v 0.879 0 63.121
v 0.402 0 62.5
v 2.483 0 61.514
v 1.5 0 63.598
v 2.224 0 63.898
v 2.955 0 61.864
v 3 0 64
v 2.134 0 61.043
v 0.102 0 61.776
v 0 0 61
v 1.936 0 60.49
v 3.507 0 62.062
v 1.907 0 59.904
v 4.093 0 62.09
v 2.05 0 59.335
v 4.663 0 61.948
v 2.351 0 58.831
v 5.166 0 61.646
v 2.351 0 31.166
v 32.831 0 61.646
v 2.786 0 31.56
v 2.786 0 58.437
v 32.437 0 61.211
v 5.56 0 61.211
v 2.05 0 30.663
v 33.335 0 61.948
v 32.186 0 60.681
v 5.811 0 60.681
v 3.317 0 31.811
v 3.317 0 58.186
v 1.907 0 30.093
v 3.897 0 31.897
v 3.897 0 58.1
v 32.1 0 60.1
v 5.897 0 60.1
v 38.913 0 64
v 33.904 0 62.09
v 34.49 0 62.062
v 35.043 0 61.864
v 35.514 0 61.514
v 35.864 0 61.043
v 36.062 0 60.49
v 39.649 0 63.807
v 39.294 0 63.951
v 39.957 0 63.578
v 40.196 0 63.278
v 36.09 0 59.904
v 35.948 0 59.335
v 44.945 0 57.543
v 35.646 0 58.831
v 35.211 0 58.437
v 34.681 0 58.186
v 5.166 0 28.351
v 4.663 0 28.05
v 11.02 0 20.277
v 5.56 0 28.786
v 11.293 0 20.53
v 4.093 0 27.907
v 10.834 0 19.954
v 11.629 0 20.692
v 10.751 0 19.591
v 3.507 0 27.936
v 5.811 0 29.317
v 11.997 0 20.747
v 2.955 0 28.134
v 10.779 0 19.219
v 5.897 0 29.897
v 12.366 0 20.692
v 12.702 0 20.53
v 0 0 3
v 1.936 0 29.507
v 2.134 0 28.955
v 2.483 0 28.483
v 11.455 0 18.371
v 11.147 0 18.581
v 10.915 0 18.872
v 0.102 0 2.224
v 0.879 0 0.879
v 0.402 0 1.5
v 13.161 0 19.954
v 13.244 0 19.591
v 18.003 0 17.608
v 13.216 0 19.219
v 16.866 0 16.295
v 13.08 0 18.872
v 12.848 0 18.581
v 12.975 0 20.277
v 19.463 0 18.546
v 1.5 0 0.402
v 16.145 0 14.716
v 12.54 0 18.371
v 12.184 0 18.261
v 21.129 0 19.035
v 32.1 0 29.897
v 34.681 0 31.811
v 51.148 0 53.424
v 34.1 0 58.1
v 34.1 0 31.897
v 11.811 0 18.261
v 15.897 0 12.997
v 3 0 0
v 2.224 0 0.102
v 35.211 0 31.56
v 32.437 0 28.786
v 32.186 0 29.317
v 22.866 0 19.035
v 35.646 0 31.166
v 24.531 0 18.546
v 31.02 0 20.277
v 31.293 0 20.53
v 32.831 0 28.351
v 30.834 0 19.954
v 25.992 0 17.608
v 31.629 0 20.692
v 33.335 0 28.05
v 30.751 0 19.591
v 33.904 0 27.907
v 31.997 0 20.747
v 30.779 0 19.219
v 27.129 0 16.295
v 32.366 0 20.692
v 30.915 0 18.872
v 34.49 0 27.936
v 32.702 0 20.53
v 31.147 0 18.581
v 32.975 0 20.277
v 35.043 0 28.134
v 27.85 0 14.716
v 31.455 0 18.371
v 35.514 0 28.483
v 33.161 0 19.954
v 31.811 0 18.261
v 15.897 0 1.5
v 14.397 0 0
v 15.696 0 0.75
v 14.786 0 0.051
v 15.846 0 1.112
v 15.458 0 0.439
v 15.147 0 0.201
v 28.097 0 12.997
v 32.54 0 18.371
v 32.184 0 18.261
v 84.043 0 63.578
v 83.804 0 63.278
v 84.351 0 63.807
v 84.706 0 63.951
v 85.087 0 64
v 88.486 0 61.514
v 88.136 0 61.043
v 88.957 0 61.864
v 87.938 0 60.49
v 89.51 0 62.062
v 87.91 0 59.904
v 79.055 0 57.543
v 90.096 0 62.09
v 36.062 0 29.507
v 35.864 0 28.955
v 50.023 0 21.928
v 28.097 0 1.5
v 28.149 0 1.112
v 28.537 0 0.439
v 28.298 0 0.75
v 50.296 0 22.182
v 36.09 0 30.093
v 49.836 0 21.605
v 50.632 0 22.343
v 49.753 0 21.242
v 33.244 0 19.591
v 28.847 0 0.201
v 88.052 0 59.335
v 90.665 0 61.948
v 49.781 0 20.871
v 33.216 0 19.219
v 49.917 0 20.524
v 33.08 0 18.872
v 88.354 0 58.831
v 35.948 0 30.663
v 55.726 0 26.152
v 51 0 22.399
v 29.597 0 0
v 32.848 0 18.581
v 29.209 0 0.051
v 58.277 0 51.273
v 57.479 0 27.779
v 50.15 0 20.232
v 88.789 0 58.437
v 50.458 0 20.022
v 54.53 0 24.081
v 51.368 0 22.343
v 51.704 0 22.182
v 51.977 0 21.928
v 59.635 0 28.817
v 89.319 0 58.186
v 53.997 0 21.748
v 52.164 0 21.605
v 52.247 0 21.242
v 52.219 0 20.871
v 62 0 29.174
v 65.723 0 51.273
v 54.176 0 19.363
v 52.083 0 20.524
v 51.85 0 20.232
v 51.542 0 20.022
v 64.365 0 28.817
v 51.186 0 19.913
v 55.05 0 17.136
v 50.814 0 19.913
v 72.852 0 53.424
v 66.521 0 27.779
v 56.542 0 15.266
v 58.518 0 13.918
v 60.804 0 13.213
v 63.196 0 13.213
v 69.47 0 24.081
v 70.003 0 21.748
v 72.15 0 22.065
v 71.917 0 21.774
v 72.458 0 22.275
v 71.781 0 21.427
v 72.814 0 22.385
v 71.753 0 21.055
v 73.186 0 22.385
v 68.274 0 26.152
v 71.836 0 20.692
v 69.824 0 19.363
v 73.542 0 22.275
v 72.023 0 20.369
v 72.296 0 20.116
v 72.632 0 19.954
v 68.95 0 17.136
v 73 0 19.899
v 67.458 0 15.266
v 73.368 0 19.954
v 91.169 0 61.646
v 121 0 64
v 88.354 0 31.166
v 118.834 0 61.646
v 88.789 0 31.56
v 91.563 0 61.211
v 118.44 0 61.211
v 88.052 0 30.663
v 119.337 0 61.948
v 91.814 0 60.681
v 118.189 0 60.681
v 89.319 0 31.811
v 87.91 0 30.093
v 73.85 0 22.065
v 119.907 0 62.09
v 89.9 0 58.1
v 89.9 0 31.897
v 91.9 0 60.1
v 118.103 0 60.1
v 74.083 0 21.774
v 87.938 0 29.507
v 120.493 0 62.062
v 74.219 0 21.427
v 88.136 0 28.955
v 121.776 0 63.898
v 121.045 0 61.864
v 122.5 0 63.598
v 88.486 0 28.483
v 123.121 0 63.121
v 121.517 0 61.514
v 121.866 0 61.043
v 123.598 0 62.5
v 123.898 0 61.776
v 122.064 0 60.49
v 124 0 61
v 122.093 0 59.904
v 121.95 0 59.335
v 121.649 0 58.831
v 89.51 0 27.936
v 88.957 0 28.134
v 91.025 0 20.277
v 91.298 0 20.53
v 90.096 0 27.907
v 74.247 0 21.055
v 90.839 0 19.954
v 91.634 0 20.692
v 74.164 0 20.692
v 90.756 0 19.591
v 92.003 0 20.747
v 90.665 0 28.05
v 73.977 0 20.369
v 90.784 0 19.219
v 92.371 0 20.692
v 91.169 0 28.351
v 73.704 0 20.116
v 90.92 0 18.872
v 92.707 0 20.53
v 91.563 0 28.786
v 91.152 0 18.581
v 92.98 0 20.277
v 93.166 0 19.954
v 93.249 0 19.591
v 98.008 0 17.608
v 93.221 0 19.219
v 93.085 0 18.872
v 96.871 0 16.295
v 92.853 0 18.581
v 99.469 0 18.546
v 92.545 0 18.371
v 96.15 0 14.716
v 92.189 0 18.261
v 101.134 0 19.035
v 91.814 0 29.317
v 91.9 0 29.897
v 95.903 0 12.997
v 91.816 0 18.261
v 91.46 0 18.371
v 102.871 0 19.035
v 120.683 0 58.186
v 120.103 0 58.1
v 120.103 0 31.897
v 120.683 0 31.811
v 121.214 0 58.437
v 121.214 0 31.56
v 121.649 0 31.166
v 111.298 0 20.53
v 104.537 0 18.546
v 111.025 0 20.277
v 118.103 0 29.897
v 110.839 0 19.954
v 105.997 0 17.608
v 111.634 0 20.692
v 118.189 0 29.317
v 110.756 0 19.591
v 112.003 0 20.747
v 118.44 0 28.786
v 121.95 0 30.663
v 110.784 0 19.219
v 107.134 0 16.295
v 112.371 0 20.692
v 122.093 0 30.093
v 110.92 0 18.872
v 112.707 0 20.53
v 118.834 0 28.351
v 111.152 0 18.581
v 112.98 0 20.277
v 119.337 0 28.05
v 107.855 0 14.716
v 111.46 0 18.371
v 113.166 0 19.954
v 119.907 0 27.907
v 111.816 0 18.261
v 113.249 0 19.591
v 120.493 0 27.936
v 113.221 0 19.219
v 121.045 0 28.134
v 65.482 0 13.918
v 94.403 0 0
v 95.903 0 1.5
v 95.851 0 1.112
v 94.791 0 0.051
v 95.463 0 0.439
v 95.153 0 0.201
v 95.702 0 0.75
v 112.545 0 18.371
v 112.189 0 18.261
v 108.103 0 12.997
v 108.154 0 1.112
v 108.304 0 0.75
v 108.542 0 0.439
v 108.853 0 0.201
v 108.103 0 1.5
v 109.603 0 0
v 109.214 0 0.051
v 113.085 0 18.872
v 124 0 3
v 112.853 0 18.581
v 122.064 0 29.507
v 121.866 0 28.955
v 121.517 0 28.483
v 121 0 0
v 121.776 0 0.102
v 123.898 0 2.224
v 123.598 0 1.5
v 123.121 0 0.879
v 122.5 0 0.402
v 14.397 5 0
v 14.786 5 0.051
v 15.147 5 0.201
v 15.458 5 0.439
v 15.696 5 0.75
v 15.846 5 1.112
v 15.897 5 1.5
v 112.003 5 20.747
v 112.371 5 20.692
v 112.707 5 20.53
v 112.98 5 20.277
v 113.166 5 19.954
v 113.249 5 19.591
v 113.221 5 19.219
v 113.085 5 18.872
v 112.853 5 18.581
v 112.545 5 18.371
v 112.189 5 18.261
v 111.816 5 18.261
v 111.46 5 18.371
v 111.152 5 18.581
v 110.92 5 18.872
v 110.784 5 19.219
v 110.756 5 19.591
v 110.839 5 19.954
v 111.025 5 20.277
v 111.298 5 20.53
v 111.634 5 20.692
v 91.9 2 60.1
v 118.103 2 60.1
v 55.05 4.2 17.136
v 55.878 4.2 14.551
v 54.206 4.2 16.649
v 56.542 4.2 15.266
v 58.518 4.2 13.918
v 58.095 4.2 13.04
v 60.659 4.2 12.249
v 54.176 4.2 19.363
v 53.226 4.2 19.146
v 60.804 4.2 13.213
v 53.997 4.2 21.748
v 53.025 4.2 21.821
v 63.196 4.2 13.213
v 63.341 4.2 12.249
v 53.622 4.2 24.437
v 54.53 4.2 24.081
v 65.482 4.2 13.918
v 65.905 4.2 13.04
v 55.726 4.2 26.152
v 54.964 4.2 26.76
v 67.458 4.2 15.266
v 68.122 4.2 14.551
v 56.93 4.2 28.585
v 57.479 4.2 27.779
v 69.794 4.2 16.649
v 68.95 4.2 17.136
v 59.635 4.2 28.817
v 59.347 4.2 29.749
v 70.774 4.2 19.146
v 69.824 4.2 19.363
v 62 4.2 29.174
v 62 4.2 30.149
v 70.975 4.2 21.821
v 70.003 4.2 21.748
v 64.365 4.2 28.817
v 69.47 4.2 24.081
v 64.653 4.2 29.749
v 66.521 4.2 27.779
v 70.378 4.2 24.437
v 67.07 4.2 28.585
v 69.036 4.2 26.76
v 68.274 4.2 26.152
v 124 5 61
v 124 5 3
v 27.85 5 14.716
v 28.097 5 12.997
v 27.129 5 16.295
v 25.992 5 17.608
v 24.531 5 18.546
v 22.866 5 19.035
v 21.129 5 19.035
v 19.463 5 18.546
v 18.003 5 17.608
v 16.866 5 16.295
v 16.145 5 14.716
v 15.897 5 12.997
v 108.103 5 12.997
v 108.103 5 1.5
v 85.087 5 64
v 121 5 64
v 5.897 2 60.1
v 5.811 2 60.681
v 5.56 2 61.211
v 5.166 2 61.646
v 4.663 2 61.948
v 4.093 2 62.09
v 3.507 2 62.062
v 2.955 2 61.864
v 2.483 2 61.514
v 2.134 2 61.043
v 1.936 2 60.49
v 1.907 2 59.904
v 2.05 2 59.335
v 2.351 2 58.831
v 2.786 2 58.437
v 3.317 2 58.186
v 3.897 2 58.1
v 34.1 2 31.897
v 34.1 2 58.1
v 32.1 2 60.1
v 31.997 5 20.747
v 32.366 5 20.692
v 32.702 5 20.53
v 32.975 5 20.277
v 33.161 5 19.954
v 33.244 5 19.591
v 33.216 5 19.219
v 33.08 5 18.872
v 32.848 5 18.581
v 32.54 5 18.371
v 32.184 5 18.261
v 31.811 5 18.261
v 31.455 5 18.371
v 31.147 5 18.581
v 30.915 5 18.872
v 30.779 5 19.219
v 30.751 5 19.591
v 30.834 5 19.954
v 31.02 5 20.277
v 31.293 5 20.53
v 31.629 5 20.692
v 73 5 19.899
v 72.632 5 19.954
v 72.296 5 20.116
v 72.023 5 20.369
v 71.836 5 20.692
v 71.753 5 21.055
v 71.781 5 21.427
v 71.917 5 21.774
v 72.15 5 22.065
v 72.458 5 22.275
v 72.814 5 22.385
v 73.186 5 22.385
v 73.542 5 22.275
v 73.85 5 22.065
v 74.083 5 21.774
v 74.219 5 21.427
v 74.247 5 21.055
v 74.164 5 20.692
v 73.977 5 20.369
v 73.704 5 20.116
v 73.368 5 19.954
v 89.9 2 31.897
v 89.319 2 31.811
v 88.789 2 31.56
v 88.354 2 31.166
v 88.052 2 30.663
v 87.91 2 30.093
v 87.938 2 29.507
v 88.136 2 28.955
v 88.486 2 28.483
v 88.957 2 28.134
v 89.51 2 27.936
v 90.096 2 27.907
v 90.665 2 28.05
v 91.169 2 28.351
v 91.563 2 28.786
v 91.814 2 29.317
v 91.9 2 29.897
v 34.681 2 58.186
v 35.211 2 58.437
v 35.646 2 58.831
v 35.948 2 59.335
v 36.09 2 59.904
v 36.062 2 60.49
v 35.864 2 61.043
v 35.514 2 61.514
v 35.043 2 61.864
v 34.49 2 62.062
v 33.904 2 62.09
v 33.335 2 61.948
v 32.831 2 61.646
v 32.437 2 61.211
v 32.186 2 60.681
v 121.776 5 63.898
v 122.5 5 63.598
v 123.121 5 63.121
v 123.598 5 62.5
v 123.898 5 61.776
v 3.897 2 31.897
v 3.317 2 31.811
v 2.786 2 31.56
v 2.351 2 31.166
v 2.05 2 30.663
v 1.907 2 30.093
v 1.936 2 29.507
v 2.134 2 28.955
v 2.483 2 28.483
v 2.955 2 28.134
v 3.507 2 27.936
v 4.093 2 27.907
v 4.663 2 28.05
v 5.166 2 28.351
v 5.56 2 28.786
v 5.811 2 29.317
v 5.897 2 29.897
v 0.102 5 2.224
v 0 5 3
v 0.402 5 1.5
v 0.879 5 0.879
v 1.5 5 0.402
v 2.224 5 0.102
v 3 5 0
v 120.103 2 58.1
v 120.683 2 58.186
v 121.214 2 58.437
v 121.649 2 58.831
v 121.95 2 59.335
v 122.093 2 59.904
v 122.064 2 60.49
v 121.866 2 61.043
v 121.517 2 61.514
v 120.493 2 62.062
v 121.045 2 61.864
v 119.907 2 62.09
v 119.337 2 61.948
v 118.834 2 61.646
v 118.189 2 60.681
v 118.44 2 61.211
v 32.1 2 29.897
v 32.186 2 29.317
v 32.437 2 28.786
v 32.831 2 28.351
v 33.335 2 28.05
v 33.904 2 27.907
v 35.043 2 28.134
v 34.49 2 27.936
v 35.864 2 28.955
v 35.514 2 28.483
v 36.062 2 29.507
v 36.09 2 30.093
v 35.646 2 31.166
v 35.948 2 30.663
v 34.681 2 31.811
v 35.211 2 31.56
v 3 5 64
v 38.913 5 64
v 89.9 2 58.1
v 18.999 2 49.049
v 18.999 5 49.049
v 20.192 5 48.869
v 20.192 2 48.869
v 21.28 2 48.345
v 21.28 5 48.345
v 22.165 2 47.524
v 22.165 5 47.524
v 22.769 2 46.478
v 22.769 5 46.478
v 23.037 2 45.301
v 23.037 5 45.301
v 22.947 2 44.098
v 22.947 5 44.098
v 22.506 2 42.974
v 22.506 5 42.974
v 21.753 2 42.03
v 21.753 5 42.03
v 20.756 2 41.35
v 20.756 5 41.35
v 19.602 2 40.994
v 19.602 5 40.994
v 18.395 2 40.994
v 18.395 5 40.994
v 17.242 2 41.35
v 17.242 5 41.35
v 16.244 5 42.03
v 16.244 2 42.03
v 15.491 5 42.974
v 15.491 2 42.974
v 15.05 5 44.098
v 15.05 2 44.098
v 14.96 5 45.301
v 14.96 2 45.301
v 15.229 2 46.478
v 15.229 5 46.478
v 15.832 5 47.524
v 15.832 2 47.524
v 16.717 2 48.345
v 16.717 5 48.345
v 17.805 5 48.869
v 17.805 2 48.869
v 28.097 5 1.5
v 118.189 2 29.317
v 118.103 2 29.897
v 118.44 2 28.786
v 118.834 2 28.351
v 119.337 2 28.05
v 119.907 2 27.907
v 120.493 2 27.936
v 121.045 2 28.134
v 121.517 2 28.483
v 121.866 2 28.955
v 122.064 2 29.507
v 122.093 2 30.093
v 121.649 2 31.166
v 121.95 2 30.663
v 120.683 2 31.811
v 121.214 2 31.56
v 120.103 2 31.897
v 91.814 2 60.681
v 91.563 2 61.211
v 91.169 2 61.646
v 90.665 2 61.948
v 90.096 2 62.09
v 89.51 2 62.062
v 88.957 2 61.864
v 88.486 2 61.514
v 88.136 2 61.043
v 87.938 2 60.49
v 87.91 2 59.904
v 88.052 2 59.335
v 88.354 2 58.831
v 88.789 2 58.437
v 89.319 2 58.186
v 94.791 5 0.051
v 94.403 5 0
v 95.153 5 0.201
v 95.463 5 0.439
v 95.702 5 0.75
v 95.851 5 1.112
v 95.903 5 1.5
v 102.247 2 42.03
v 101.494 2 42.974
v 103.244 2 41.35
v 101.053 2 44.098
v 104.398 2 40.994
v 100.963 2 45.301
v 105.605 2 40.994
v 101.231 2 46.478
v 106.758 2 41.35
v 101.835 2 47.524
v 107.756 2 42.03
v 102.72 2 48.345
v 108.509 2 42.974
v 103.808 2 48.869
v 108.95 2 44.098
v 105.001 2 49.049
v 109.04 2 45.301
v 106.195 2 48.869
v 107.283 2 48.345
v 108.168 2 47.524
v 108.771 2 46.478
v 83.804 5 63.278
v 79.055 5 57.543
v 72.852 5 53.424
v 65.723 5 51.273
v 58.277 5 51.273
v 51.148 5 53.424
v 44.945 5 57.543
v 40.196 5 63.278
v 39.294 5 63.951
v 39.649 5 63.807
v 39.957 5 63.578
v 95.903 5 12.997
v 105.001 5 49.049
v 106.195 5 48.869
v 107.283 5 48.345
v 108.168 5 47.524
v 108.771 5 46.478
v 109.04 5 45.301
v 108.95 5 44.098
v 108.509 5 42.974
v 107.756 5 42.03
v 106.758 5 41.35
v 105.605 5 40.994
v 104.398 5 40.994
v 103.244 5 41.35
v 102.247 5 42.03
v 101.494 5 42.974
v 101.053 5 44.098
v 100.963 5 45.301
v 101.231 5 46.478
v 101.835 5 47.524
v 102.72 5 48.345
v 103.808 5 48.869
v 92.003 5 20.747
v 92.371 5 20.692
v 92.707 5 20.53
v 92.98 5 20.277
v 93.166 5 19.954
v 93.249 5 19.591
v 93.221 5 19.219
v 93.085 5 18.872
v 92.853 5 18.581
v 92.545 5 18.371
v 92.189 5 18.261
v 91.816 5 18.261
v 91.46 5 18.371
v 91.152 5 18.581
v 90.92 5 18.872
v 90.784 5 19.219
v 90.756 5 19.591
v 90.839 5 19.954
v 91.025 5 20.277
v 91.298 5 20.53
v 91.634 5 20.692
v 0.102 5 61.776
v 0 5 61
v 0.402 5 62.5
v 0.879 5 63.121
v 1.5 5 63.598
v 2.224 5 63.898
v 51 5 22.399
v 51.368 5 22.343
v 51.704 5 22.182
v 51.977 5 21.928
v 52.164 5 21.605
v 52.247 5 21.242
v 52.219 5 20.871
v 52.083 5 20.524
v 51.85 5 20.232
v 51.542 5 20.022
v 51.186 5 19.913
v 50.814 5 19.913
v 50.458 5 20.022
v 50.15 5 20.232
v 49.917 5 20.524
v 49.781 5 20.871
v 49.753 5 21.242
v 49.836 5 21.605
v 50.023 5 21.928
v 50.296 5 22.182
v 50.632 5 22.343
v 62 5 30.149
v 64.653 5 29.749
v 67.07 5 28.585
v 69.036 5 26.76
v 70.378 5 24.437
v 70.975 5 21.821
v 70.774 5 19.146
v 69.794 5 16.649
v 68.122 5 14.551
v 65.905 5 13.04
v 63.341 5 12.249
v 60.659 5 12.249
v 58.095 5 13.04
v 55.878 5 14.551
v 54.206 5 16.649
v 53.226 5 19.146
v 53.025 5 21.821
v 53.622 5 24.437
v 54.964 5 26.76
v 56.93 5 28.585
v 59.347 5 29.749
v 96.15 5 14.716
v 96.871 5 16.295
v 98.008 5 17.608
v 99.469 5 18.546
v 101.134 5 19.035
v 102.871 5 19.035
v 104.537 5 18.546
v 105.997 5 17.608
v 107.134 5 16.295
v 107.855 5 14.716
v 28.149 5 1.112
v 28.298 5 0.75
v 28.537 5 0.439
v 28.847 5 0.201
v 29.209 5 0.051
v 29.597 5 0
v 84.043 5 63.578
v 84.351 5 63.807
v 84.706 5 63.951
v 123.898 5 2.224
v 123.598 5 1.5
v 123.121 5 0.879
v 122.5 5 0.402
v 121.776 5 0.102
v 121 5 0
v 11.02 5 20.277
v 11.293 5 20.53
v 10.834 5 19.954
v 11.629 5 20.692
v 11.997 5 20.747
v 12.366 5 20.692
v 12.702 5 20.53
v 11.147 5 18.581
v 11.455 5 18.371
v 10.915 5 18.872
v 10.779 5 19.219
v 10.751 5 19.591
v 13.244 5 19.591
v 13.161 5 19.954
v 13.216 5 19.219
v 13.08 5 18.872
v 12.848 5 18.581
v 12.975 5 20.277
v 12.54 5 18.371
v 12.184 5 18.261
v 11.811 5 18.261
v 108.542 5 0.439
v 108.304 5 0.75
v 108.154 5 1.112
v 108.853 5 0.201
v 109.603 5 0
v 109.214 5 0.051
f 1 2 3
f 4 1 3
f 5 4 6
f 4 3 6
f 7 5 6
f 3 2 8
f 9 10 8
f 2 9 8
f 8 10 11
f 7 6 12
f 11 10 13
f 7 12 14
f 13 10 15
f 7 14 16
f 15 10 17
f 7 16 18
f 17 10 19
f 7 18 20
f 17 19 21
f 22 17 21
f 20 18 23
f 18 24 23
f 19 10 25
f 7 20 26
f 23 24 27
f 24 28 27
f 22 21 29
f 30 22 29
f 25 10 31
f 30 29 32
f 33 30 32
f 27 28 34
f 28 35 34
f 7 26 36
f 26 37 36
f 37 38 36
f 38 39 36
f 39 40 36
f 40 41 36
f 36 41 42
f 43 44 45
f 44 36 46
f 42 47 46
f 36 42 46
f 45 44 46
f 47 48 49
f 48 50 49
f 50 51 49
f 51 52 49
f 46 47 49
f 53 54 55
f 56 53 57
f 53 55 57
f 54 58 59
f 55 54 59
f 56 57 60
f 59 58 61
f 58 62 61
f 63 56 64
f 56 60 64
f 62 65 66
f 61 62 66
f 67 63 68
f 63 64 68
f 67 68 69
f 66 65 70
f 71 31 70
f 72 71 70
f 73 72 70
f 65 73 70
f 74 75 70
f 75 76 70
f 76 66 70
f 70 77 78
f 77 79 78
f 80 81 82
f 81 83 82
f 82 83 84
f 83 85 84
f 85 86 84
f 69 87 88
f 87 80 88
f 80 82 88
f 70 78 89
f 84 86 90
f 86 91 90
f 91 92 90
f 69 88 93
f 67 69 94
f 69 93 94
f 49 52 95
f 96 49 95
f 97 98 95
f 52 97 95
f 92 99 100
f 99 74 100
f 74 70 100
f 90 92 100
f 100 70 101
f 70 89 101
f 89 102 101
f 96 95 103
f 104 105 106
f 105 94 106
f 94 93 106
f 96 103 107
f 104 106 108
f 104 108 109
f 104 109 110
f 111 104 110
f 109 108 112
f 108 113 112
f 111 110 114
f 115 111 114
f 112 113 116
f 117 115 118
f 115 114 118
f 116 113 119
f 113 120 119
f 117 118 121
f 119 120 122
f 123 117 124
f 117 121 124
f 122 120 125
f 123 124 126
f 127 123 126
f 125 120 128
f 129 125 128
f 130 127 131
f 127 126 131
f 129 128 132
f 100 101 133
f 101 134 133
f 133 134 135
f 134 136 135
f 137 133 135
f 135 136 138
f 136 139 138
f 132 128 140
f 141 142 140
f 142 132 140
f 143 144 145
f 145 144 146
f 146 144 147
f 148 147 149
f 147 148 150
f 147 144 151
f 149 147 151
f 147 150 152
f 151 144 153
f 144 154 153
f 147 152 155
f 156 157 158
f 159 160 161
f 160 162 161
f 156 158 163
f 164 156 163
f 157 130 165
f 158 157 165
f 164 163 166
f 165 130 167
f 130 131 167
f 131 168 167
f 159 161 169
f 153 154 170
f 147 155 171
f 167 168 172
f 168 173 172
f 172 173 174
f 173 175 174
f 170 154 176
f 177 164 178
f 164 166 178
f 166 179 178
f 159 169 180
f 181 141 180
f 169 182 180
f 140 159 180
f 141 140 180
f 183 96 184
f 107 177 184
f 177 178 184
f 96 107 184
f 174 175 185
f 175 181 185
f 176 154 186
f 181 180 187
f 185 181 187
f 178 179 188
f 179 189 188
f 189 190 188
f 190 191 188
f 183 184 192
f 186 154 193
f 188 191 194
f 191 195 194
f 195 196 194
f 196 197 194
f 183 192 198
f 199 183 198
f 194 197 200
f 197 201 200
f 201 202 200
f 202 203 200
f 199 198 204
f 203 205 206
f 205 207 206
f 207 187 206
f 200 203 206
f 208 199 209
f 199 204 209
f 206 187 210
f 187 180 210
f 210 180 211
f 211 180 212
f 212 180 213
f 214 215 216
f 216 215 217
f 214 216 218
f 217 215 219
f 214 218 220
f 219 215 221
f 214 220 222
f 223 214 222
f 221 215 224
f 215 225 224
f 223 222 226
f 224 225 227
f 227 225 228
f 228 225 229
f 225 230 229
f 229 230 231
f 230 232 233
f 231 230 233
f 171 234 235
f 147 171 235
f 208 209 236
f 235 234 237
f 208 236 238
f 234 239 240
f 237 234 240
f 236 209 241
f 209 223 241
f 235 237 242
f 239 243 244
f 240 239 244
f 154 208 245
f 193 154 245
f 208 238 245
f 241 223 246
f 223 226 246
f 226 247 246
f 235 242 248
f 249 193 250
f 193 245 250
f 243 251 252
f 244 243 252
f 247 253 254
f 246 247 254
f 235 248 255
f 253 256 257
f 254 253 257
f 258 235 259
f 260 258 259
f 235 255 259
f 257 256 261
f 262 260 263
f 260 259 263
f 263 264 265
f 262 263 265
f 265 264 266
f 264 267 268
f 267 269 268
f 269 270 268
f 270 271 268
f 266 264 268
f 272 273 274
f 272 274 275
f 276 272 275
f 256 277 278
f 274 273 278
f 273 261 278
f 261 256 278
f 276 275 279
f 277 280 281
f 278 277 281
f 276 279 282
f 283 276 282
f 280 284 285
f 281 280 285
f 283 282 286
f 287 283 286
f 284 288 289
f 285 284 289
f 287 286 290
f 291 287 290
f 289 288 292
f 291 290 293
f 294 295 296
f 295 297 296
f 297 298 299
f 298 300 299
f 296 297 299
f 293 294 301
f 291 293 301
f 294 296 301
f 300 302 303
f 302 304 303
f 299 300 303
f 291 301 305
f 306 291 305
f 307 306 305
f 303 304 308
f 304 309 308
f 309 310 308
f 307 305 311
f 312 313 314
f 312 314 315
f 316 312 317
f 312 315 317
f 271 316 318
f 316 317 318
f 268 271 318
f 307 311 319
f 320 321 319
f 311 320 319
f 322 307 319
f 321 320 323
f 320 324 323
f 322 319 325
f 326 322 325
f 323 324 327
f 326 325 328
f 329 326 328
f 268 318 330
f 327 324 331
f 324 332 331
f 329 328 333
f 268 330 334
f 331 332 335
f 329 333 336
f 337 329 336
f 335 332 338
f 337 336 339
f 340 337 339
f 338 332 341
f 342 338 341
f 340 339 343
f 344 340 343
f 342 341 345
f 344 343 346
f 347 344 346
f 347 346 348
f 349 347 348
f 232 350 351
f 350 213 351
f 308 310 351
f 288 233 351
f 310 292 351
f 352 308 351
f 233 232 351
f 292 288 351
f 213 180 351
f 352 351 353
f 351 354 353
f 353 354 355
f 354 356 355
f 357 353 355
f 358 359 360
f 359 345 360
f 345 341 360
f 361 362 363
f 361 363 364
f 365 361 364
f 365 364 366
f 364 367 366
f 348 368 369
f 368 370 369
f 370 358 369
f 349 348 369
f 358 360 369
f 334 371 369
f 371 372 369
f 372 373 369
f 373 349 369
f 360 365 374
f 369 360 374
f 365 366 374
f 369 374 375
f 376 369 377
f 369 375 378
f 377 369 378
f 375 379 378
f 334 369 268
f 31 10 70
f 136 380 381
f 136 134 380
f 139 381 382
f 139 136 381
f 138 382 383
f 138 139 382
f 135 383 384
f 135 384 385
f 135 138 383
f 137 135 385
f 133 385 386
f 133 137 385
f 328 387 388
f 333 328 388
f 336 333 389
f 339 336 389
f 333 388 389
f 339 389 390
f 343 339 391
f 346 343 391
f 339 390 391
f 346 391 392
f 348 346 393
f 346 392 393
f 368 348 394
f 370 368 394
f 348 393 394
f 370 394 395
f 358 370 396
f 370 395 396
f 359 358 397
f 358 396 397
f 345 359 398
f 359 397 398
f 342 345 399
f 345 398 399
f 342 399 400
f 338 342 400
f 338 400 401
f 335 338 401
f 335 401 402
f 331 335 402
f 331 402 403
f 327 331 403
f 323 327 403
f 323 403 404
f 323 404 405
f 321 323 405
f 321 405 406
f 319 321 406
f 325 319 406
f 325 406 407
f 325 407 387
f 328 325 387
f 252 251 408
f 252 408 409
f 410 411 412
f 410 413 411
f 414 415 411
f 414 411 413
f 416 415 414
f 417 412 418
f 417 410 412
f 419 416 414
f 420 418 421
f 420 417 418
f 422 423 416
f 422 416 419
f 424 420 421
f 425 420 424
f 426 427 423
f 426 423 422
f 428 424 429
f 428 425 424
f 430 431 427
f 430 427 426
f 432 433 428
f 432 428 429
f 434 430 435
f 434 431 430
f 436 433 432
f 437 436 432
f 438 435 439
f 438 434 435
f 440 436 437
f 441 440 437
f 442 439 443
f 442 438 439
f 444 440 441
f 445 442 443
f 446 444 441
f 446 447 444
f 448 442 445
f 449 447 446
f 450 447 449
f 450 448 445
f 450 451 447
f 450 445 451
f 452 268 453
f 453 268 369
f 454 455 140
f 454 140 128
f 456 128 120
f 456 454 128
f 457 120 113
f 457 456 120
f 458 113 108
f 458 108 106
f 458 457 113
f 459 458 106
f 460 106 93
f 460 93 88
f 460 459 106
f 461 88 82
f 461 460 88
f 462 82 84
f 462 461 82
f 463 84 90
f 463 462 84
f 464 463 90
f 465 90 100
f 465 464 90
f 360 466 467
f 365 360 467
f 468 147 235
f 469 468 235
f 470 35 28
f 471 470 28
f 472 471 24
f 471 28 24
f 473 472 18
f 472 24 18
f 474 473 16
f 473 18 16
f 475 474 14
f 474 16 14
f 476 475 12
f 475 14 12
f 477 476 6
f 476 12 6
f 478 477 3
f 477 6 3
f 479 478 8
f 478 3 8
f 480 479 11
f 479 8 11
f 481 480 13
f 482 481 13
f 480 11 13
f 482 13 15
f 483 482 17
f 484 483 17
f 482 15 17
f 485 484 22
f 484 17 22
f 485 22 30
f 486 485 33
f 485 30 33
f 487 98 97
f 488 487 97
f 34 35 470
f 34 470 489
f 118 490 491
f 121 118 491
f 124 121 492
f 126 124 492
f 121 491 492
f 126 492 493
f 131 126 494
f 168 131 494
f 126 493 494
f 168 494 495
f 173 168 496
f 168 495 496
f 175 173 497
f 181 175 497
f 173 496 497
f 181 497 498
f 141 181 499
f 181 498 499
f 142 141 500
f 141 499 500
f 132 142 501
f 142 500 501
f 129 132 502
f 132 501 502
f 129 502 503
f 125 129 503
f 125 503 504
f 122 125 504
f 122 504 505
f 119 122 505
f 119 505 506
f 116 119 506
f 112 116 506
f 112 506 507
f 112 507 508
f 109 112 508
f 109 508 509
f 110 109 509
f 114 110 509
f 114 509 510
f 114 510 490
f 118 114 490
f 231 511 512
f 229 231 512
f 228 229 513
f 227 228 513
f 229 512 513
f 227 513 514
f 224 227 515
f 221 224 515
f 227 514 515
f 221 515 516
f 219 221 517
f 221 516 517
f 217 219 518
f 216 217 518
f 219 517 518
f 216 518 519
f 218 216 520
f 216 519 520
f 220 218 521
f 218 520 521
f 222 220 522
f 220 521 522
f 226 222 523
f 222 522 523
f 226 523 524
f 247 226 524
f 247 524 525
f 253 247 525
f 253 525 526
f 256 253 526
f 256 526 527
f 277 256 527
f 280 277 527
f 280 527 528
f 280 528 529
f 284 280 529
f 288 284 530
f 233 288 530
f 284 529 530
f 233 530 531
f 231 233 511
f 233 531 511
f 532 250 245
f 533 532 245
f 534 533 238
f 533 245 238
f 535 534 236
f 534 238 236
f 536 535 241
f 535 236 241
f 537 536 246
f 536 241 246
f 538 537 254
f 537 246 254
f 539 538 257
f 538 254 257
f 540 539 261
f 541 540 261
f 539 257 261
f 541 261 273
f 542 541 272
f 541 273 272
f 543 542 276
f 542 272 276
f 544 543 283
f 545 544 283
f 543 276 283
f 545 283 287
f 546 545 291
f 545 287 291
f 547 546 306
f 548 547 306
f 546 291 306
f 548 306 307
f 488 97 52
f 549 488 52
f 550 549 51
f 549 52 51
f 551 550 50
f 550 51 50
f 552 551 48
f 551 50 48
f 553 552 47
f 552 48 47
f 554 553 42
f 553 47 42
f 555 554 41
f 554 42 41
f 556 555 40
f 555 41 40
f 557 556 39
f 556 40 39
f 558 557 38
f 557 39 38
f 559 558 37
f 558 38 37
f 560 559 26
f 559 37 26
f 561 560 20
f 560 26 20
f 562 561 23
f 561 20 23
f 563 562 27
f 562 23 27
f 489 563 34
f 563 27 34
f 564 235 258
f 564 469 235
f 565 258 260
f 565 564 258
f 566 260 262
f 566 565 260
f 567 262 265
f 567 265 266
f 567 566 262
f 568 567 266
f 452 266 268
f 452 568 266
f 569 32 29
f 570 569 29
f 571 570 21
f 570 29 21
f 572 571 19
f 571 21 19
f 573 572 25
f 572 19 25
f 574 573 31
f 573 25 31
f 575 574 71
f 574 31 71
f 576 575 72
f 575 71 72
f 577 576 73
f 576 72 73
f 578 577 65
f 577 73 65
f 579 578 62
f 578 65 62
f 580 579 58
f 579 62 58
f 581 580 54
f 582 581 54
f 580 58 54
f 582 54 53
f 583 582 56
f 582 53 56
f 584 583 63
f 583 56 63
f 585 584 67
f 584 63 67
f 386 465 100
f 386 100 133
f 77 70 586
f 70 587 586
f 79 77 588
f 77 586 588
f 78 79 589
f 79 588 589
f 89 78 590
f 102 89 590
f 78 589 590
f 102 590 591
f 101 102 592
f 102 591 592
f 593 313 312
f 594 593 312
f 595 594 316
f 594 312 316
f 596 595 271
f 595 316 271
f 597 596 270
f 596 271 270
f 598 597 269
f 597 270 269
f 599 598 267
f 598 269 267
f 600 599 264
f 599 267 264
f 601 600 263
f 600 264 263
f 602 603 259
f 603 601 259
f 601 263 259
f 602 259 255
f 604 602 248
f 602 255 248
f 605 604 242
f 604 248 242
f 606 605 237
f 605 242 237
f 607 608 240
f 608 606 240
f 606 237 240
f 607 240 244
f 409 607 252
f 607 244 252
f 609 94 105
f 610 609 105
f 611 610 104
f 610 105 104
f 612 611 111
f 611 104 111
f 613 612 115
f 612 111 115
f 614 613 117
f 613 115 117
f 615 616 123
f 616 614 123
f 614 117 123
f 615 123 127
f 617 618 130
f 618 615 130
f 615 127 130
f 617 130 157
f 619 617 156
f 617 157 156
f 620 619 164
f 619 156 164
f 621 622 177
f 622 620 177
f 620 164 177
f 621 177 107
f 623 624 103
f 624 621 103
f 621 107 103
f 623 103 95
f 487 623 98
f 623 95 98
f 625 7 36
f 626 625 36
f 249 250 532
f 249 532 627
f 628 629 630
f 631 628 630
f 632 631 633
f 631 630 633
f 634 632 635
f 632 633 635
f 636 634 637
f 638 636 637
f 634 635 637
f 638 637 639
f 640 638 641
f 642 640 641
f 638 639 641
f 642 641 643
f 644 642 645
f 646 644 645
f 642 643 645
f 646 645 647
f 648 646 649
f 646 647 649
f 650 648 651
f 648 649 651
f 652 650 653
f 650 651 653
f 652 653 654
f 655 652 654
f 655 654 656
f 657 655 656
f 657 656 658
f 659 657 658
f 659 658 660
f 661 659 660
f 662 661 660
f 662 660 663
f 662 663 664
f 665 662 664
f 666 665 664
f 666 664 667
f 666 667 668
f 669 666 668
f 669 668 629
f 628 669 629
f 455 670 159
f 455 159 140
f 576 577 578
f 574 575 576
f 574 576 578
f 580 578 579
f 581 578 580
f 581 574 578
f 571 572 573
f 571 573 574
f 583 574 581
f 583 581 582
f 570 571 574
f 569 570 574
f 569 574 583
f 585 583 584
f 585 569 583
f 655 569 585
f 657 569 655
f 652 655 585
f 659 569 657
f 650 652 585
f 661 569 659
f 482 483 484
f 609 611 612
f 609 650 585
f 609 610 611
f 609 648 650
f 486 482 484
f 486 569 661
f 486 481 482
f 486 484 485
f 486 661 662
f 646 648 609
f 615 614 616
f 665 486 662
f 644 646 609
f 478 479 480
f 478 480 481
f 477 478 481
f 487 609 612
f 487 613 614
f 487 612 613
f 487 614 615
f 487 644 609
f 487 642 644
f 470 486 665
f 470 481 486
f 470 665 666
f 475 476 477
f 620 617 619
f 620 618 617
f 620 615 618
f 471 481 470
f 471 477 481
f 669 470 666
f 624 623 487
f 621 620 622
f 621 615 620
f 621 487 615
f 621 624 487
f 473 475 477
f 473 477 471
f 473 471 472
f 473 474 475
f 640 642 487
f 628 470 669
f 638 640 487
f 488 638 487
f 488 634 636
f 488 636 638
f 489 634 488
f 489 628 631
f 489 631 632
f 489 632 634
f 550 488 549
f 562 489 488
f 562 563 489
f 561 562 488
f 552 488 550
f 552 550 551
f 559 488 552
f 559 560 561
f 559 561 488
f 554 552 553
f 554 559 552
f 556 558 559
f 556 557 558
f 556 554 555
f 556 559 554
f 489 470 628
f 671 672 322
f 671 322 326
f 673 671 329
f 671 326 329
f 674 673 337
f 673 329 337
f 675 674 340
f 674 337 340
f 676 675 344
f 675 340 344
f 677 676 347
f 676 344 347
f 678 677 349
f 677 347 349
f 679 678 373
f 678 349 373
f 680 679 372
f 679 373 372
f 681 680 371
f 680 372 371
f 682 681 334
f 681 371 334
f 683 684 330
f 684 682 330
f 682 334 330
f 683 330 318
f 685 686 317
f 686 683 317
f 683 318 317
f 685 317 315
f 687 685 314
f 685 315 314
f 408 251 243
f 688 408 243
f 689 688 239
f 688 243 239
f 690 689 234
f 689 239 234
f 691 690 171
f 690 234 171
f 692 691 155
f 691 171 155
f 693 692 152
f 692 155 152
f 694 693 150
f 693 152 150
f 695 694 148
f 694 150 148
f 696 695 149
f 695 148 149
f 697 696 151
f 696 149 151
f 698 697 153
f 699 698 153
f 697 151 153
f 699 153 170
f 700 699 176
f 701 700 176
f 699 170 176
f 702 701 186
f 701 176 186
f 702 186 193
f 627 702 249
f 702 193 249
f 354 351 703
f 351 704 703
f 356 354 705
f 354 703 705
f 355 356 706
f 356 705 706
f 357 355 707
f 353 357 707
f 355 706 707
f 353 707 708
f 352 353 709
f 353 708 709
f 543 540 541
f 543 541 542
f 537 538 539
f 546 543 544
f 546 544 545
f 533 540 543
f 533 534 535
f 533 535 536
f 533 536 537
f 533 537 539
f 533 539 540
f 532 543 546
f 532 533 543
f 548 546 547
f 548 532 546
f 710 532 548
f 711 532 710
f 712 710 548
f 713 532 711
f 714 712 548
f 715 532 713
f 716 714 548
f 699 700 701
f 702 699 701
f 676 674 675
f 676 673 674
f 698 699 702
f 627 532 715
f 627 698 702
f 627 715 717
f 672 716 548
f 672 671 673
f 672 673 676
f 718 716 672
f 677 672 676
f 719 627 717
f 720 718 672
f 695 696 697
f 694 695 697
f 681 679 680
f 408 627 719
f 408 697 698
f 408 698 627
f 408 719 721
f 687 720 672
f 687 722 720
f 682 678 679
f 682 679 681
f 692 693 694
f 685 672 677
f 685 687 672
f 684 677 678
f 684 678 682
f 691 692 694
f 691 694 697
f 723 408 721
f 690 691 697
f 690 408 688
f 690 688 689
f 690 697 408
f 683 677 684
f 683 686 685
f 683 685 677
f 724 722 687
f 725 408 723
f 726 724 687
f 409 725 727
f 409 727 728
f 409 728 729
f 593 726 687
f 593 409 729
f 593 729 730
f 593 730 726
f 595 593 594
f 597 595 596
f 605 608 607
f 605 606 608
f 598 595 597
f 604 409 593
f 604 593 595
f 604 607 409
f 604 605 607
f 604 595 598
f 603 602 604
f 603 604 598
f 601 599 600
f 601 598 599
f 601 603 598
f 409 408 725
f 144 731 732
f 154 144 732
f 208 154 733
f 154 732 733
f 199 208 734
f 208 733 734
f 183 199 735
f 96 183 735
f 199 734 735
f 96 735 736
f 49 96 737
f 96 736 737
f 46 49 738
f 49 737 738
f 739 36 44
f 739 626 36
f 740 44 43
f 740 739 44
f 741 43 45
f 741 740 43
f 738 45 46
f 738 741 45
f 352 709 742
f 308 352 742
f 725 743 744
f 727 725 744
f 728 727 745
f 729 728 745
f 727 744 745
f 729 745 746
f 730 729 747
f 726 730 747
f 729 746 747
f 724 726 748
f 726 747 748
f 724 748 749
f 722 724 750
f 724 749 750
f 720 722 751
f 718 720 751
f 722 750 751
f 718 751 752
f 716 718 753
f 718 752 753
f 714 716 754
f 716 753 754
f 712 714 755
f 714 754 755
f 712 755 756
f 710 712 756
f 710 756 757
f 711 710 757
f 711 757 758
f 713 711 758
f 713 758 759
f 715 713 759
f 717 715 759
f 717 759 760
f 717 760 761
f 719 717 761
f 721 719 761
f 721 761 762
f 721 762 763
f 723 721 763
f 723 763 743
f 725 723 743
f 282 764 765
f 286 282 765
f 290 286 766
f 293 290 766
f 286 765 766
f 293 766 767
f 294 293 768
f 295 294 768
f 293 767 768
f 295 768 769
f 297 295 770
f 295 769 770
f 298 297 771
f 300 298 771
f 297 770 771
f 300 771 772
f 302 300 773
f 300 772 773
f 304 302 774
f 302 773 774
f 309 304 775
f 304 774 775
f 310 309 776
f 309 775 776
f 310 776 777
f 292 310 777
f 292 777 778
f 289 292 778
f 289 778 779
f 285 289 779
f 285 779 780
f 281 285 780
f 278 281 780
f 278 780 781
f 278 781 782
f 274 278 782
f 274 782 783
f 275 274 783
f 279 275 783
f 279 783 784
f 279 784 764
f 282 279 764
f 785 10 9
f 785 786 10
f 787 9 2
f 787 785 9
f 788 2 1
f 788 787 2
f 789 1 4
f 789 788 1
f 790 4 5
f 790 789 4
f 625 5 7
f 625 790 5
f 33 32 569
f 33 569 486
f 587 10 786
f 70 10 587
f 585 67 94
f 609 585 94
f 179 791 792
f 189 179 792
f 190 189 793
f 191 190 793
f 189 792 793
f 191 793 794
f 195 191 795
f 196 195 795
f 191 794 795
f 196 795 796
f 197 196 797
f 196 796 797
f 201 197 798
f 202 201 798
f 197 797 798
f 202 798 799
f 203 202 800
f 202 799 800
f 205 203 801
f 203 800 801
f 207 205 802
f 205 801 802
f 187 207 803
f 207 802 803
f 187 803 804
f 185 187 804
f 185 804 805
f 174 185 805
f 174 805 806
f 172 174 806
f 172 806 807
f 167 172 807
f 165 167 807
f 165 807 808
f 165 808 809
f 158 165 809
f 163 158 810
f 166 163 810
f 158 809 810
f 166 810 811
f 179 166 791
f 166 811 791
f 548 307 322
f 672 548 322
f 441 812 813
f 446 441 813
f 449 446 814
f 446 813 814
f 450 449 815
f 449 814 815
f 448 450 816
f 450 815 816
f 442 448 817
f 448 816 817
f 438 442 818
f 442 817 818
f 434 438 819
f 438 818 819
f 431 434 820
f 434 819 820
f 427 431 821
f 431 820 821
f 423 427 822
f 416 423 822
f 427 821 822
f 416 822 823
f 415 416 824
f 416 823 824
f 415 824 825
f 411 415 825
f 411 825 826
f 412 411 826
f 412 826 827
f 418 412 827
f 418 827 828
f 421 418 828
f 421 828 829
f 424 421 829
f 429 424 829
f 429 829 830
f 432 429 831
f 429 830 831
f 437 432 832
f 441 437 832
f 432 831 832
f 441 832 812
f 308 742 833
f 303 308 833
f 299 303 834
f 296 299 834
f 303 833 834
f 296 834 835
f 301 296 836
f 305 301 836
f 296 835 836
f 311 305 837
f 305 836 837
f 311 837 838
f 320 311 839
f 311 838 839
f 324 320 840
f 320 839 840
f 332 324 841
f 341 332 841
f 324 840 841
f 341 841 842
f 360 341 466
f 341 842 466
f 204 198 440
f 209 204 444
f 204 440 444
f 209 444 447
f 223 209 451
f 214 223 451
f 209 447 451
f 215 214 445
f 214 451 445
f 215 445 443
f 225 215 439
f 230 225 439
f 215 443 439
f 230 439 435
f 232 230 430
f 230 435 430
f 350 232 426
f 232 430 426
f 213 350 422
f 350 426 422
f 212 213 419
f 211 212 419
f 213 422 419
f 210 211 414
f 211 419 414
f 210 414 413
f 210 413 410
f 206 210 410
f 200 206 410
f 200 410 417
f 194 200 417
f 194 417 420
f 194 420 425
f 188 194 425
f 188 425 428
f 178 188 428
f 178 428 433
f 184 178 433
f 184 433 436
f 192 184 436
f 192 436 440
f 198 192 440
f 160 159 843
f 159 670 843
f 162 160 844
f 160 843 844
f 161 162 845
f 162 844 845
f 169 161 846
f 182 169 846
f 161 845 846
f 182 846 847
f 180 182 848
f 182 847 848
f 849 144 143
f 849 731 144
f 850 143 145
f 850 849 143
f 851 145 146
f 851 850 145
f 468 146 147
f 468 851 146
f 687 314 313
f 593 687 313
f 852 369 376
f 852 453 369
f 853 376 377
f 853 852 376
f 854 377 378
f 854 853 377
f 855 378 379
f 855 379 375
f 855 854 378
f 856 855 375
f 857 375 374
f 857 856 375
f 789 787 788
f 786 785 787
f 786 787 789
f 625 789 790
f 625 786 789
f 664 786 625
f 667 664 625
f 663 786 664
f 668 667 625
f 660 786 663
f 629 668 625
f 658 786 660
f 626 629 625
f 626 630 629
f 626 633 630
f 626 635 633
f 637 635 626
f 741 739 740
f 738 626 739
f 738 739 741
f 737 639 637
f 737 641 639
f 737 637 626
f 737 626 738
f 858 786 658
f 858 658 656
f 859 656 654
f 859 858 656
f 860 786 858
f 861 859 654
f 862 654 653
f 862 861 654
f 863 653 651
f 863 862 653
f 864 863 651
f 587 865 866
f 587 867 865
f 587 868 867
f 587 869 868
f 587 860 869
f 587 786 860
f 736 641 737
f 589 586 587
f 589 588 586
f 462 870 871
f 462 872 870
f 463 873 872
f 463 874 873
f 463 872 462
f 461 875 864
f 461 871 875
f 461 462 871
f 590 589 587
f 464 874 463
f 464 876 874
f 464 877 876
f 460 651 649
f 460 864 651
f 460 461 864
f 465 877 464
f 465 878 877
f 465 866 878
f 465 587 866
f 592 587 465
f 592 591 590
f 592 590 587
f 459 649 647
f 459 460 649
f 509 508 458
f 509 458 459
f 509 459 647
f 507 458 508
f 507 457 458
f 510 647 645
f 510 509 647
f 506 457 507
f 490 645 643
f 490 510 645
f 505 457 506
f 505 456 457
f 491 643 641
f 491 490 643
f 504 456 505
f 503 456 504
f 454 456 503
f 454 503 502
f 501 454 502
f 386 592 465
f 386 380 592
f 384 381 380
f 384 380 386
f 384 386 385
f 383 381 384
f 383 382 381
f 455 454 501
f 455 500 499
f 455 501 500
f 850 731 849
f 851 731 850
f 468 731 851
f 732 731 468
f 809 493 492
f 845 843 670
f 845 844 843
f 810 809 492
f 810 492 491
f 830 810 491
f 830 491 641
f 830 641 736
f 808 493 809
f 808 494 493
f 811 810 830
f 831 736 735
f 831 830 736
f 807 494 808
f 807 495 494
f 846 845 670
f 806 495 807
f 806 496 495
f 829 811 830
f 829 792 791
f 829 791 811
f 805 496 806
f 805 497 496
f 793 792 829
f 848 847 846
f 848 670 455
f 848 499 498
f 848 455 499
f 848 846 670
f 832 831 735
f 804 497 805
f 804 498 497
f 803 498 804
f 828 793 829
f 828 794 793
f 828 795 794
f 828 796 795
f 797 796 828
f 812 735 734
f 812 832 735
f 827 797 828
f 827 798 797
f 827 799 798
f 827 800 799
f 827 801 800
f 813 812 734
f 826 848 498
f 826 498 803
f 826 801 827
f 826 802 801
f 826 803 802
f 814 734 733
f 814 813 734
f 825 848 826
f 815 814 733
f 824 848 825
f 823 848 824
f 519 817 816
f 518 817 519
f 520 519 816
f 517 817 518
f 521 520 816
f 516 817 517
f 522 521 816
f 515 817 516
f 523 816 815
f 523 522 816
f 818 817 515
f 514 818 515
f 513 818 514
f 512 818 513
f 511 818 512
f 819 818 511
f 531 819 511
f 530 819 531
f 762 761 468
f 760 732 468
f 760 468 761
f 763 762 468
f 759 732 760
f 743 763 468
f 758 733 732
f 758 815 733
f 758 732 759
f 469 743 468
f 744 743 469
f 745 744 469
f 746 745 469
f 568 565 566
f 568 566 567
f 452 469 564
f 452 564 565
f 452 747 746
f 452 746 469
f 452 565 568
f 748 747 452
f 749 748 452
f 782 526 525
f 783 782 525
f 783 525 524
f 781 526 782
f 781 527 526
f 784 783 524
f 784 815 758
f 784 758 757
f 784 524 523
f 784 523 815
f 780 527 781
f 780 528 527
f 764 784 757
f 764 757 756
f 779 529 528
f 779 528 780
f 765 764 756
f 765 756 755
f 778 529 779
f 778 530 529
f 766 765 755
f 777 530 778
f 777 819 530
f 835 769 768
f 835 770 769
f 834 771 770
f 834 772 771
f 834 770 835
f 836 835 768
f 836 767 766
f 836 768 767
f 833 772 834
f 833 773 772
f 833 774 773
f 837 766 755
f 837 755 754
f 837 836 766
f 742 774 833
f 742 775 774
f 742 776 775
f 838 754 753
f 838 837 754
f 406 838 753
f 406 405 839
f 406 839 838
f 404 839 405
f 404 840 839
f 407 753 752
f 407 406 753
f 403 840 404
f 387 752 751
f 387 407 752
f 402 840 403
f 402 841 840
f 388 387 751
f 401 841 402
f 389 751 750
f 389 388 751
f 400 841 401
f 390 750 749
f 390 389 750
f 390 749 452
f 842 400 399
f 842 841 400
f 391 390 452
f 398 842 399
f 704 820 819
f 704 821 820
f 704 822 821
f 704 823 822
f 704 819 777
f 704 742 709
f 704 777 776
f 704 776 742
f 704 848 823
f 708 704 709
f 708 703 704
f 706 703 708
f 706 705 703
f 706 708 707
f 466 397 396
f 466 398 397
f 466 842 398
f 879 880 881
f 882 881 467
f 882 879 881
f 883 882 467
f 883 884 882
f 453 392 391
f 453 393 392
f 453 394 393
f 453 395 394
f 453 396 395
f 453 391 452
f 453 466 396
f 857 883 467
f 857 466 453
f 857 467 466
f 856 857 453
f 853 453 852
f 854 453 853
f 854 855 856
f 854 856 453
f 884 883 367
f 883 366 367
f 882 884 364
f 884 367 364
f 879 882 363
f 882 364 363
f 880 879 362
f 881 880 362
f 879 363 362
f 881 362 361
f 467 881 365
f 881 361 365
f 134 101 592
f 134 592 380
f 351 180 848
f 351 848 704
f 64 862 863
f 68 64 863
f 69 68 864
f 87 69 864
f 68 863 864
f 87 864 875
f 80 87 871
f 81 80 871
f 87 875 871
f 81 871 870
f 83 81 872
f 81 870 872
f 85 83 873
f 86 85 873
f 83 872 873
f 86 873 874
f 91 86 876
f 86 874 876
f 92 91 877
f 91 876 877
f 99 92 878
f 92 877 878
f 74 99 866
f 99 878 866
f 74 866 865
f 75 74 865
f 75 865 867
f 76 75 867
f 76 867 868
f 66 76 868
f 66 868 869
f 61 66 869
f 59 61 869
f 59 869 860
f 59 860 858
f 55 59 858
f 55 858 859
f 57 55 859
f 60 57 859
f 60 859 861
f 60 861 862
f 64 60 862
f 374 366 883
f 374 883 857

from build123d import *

# Parameters (mm, degrees)
SKETCH1_W           = 124
SKETCH1_H           = 64
BOSS_EXTRUDE1_DEPTH = 5
CUT_EXTRUDE1_DEPTH  = 5
SKETCH3_W           = 30.202540726
SKETCH3_H           = 30.202540726
CUT_EXTRUDE2_DEPTH  = 2
SKETCH4_R           = 2
CUT_EXTRUDE3_DEPTH  = 2
SKETCH5_R           = 8.025
SKETCH5_R_2         = 4.05
SKETCH5_R_3         = 25.5
CUT_EXTRUDE4_DEPTH  = 5
SKETCH6_R           = 1.25
CUT_EXTRUDE5_DEPTH  = 10
FILLET1_R           = 3
FILLET2_R           = 1.5
SKETCH7_R           = 9
CUT_EXTRUDE6_DEPTH  = 0.8
SKETCH8_R           = 1.25
CUT_EXTRUDE7_DEPTH  = 5


with BuildPart() as part:
    # Sketch1 → Boss-Extrude1 (new body)
    with BuildSketch(Plane(origin=(0, 0, 0), x_dir=(1, 0, 0), z_dir=(0, 1, 0))):
        with Locations((62, -32)):
            Rectangle(SKETCH1_W, SKETCH1_H)
    extrude(amount=BOSS_EXTRUDE1_DEPTH)

    # Sketch2 → Cut-Extrude1 (cut)
    with BuildSketch(Plane(origin=(0, 5, 0), x_dir=(1, 0, 0), z_dir=(0, 1, 0))):
        with BuildLine():
            Line((15.897459274, -12.997459274), (15.897459274, 12.365379101))
            Line((15.897459274, 12.365379101), (28.097459274, 12.365379101))
            Line((28.097459274, 12.365379101), (28.097459274, -12.997459274))
            ThreePointArc((28.097459274, -12.997459274), (21.997459274, -19.097459274), (15.897459274, -12.997459274))
        make_face()
        with BuildLine():
            Line((95.902540726, 12.365379101), (95.902540726, -12.997459274))
            ThreePointArc((95.902540726, -12.997459274), (102.002540726, -19.097459274), (108.102540726, -12.997459274))
            Line((108.102540726, -12.997459274), (108.102540726, 12.365379101))
            Line((108.102540726, 12.365379101), (95.902540726, 12.365379101))
        make_face()
    extrude(amount=-CUT_EXTRUDE1_DEPTH, mode=Mode.SUBTRACT)

    # Sketch3 → Cut-Extrude2 (cut)
    with BuildSketch(Plane.XZ):
        with Locations((18.998729637, 44.998729637)):
            Rectangle(SKETCH3_W, SKETCH3_H)
        with Locations((105.001270363, 44.998729637)):
            Rectangle(SKETCH3_W, SKETCH3_H)
    extrude(amount=-CUT_EXTRUDE2_DEPTH, mode=Mode.SUBTRACT)

    # Sketch4 → Cut-Extrude3 (cut)
    with BuildSketch(Plane.XZ):
        with Locations((34.1, 29.897459274)):
            Circle(SKETCH4_R)
        with Locations((34.1, 60.1)):
            Circle(SKETCH4_R)
        with Locations((3.897459274, 60.1)):
            Circle(SKETCH4_R)
        with Locations((3.897459274, 29.897459274)):
            Circle(SKETCH4_R)
        with Locations((120.102540726, 29.897459274)):
            Circle(SKETCH4_R)
        with Locations((120.102540726, 60.1)):
            Circle(SKETCH4_R)
        with Locations((89.9, 60.1)):
            Circle(SKETCH4_R)
        with Locations((89.9, 29.897459274)):
            Circle(SKETCH4_R)
    extrude(amount=-CUT_EXTRUDE3_DEPTH, mode=Mode.SUBTRACT)

    # Sketch5 → Cut-Extrude4 (cut)
    with BuildSketch(Plane(origin=(0, 5, 0), x_dir=(1, 0, 0), z_dir=(0, 1, 0))):
        with Locations(Location((62, -21.148702719, 0), (0, 0, 270))):
            Circle(SKETCH5_R)
        with Locations(Location((18.998729637, -44.998729637, 0), (0, 0, 270))):
            Circle(SKETCH5_R_2)
        with Locations(Location((105.001270363, -44.998729637, 0), (0, 0, 270))):
            Circle(SKETCH5_R_2)
        with Locations((62, -76.5)):
            Circle(SKETCH5_R_3)
    extrude(amount=-CUT_EXTRUDE4_DEPTH, mode=Mode.SUBTRACT)

    # Sketch6 → Cut-Extrude5 (cut)
    with BuildSketch(Plane(origin=(0, 5, 0), x_dir=(1, 0, 0), z_dir=(0, 1, 0))):
        with Locations(Location((92.002540726, -19.497459274, 0), (0, 0, 270))):
            Circle(SKETCH6_R)
        with Locations(Location((112.002540726, -19.497459274, 0), (0, 0, 270))):
            Circle(SKETCH6_R)
        with Locations(Location((31.997459274, -19.497459274, 0), (0, 0, 270))):
            Circle(SKETCH6_R)
        with Locations(Location((11.997459274, -19.497459274, 0), (0, 0, 270))):
            Circle(SKETCH6_R)
    extrude(amount=-CUT_EXTRUDE5_DEPTH, mode=Mode.SUBTRACT)

    # Fillet1
    fillet1_edges = [part.edges().sort_by_distance(p)[0] for p in [
        (0, 2.5, 0),
        (124, 2.5, 0),
        (124, 2.5, 64),
        (0, 2.5, 64),
    ]]
    fillet(fillet1_edges, radius=FILLET1_R)

    # Fillet2
    fillet2_edges = [part.edges().sort_by_distance(p)[0] for p in [
        (39.773889229, 2.5, 64),
        (84.226110771, 2.5, 64),
        (15.897459274, 2.5, 0),
        (28.097459274, 2.5, 0),
        (95.902540726, 2.5, 0),
        (108.102540726, 2.5, 0),
    ]]
    fillet(fillet2_edges, radius=FILLET2_R)

    # Sketch7 → Cut-Extrude6 (cut)
    with BuildSketch(Plane(origin=(0, 5, 0), x_dir=(1, 0, 0), z_dir=(0, 1, 0))):
        with Locations(Location((62, -21.148702719, 0), (0, 0, 270))):
            Circle(SKETCH7_R)
    extrude(amount=-CUT_EXTRUDE6_DEPTH, mode=Mode.SUBTRACT)

    # Sketch8 → Cut-Extrude7 (cut)
    with BuildSketch(Plane(origin=(0, 5, 0), x_dir=(1, 0, 0), z_dir=(0, 1, 0))):
        with Locations(Location((51, -21.148702719, 0), (0, 0, 270))):
            Circle(SKETCH8_R)
        with Locations(Location((73, -21.148702719, 0), (0, 0, 90))):
            Circle(SKETCH8_R)
    extrude(amount=-CUT_EXTRUDE7_DEPTH, mode=Mode.SUBTRACT)


solid = part.part
